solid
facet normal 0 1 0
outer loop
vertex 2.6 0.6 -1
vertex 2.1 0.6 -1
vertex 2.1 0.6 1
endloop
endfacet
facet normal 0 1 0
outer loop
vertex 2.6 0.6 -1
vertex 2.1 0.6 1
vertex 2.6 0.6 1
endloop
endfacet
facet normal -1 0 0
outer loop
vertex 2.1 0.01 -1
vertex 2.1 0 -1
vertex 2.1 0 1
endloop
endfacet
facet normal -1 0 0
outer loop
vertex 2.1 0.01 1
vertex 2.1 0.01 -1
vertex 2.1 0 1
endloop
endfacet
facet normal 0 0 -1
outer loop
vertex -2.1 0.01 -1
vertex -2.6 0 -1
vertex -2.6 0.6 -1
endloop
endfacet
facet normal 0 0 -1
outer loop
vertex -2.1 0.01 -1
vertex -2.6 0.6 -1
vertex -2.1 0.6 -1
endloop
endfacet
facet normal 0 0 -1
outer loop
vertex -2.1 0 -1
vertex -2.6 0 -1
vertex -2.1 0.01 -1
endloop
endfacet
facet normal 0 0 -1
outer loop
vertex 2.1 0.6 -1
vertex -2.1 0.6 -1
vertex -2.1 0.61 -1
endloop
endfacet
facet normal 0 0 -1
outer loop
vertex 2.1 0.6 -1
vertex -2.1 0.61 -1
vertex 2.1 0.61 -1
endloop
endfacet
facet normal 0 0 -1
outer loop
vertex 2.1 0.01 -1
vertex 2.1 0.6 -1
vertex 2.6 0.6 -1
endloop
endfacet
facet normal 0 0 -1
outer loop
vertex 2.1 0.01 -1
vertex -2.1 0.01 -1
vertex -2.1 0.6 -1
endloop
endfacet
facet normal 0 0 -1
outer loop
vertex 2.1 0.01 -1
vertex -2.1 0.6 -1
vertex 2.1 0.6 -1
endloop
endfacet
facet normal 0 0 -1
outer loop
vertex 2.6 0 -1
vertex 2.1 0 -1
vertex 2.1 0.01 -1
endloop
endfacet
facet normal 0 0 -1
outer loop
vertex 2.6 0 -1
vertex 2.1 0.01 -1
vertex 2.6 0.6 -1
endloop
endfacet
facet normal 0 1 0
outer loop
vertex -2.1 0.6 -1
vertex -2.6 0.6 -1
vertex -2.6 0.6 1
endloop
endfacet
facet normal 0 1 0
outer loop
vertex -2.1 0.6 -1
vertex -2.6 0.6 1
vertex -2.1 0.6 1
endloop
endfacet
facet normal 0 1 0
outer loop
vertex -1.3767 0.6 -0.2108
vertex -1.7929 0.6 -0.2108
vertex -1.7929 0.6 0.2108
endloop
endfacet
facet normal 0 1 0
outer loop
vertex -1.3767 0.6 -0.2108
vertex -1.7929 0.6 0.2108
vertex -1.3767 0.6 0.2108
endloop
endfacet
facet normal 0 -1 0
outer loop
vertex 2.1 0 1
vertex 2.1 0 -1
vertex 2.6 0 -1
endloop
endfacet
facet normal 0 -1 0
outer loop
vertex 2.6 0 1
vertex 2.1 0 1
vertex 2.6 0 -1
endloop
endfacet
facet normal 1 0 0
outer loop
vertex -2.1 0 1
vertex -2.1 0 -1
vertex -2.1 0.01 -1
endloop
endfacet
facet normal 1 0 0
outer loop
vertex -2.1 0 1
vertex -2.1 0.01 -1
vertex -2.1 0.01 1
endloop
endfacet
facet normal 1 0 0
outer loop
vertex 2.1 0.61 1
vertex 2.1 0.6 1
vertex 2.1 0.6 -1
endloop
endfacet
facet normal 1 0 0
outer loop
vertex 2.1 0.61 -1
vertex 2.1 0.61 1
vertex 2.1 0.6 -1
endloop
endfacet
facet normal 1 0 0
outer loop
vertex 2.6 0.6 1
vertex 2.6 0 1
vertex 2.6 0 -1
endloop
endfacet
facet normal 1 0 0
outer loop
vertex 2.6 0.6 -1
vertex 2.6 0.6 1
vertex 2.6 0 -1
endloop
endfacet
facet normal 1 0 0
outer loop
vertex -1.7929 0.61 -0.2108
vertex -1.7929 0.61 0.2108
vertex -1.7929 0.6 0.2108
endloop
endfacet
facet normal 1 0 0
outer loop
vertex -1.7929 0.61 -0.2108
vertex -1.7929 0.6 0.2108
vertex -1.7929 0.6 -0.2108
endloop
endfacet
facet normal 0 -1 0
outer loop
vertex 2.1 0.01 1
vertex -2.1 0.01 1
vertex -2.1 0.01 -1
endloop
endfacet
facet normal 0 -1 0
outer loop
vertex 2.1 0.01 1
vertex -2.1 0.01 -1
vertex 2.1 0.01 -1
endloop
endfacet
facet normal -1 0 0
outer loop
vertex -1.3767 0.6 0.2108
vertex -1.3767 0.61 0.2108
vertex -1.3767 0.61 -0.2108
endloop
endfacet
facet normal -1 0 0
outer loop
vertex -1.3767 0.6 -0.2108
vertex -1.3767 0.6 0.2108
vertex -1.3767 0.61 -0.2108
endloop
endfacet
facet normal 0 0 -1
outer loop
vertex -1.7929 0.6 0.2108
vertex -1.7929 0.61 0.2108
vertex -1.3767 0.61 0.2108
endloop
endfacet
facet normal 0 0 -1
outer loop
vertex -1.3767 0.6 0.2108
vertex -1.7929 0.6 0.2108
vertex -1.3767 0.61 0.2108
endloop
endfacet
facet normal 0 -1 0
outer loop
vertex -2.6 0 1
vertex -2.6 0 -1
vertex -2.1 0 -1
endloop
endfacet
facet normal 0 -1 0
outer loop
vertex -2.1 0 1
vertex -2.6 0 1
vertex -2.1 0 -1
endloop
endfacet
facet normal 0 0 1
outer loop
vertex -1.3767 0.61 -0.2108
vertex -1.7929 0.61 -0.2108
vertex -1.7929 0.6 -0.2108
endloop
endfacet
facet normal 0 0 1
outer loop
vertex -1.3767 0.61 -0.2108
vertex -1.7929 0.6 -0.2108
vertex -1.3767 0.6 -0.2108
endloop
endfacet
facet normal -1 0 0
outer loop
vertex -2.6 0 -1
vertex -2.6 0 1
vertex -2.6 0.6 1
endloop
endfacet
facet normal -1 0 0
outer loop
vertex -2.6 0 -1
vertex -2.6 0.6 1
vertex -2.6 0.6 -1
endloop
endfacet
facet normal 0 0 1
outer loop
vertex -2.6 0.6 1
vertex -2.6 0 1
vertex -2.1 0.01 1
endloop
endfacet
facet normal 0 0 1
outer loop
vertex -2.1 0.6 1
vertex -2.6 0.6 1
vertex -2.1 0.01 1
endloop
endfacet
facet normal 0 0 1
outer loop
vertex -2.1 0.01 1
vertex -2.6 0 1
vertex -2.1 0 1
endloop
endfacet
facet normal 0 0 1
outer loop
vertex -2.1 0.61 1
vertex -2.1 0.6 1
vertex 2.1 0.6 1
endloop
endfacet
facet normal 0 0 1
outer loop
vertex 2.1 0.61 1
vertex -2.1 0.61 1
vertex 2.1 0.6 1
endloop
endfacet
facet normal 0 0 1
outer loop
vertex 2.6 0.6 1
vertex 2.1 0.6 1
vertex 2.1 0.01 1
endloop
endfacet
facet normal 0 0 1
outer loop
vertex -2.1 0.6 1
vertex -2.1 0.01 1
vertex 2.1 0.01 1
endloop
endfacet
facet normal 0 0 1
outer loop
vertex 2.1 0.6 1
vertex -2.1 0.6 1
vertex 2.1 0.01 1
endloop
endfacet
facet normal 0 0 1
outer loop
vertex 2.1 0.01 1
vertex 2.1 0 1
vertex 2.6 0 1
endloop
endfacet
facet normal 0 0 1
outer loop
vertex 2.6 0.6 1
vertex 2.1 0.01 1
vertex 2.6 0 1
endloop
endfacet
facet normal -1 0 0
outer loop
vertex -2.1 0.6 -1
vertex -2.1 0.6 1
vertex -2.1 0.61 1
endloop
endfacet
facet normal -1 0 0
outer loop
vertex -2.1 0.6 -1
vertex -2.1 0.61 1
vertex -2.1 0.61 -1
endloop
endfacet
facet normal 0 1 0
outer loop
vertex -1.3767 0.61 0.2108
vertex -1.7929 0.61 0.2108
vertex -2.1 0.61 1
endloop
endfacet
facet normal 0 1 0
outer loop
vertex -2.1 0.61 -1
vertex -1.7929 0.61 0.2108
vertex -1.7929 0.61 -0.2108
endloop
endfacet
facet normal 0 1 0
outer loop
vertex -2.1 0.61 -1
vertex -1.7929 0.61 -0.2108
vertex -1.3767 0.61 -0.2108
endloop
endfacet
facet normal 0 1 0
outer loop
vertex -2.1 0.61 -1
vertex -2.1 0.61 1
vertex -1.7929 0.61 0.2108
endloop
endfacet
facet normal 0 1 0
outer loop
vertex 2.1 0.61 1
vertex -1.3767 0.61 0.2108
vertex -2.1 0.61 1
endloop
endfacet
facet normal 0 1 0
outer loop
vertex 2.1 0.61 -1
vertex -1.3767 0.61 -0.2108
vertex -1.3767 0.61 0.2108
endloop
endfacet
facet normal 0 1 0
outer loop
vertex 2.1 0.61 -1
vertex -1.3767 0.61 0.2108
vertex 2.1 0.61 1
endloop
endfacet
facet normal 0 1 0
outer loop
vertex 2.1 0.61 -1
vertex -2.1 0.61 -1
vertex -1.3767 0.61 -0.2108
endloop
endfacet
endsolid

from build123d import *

# Parameters (mm, degrees)
SKETCH_1_W          = 5.2
SKETCH_1_H          = 2
EXTRUDE_1_DEPTH     = 0.6
SKETCH_2_W          = 4.2
SKETCH_2_H          = 2
EXTRUDE_2_DEPTH     = 0.01
SKETCH_3_W          = 0.416220045
SKETCH_3_H          = 0.4215562
CUT_EXTRUDE_1_DEPTH = 0.01
SKETCH_4_W          = 4.2
SKETCH_4_H          = 2
CUT_EXTRUDE_2_DEPTH = 0.01


with BuildPart() as part:
    # Эскиз1 → Бобышка-Вытянуть1 (new body)
    with BuildSketch(Plane(origin=(0, 0, 0), x_dir=(1, 0, 0), z_dir=(0, 1, 0))):
        Rectangle(SKETCH_1_W, SKETCH_1_H)
    extrude(amount=EXTRUDE_1_DEPTH)

    # Эскиз2 → Бобышка-Вытянуть2 (add)
    with BuildSketch(Plane(origin=(0, 0.6, 0), x_dir=(1, 0, 0), z_dir=(0, 1, 0))):
        Rectangle(SKETCH_2_W, SKETCH_2_H)
    extrude(amount=EXTRUDE_2_DEPTH)

    # Эскиз3 → Вырез-Вытянуть1 (cut)
    with BuildSketch(Plane(origin=(0, 0.61, 0), x_dir=(1, 0, 0), z_dir=(0, 1, 0))):
        with Locations((-1.584837867, 0)):
            Rectangle(SKETCH_3_W, SKETCH_3_H)
    extrude(amount=-CUT_EXTRUDE_1_DEPTH, mode=Mode.SUBTRACT)

    # Эскиз4 → Вырез-Вытянуть2 (cut)
    with BuildSketch(Plane.XZ):
        Rectangle(SKETCH_4_W, SKETCH_4_H)
    extrude(amount=-CUT_EXTRUDE_2_DEPTH, mode=Mode.SUBTRACT)


solid = part.part
